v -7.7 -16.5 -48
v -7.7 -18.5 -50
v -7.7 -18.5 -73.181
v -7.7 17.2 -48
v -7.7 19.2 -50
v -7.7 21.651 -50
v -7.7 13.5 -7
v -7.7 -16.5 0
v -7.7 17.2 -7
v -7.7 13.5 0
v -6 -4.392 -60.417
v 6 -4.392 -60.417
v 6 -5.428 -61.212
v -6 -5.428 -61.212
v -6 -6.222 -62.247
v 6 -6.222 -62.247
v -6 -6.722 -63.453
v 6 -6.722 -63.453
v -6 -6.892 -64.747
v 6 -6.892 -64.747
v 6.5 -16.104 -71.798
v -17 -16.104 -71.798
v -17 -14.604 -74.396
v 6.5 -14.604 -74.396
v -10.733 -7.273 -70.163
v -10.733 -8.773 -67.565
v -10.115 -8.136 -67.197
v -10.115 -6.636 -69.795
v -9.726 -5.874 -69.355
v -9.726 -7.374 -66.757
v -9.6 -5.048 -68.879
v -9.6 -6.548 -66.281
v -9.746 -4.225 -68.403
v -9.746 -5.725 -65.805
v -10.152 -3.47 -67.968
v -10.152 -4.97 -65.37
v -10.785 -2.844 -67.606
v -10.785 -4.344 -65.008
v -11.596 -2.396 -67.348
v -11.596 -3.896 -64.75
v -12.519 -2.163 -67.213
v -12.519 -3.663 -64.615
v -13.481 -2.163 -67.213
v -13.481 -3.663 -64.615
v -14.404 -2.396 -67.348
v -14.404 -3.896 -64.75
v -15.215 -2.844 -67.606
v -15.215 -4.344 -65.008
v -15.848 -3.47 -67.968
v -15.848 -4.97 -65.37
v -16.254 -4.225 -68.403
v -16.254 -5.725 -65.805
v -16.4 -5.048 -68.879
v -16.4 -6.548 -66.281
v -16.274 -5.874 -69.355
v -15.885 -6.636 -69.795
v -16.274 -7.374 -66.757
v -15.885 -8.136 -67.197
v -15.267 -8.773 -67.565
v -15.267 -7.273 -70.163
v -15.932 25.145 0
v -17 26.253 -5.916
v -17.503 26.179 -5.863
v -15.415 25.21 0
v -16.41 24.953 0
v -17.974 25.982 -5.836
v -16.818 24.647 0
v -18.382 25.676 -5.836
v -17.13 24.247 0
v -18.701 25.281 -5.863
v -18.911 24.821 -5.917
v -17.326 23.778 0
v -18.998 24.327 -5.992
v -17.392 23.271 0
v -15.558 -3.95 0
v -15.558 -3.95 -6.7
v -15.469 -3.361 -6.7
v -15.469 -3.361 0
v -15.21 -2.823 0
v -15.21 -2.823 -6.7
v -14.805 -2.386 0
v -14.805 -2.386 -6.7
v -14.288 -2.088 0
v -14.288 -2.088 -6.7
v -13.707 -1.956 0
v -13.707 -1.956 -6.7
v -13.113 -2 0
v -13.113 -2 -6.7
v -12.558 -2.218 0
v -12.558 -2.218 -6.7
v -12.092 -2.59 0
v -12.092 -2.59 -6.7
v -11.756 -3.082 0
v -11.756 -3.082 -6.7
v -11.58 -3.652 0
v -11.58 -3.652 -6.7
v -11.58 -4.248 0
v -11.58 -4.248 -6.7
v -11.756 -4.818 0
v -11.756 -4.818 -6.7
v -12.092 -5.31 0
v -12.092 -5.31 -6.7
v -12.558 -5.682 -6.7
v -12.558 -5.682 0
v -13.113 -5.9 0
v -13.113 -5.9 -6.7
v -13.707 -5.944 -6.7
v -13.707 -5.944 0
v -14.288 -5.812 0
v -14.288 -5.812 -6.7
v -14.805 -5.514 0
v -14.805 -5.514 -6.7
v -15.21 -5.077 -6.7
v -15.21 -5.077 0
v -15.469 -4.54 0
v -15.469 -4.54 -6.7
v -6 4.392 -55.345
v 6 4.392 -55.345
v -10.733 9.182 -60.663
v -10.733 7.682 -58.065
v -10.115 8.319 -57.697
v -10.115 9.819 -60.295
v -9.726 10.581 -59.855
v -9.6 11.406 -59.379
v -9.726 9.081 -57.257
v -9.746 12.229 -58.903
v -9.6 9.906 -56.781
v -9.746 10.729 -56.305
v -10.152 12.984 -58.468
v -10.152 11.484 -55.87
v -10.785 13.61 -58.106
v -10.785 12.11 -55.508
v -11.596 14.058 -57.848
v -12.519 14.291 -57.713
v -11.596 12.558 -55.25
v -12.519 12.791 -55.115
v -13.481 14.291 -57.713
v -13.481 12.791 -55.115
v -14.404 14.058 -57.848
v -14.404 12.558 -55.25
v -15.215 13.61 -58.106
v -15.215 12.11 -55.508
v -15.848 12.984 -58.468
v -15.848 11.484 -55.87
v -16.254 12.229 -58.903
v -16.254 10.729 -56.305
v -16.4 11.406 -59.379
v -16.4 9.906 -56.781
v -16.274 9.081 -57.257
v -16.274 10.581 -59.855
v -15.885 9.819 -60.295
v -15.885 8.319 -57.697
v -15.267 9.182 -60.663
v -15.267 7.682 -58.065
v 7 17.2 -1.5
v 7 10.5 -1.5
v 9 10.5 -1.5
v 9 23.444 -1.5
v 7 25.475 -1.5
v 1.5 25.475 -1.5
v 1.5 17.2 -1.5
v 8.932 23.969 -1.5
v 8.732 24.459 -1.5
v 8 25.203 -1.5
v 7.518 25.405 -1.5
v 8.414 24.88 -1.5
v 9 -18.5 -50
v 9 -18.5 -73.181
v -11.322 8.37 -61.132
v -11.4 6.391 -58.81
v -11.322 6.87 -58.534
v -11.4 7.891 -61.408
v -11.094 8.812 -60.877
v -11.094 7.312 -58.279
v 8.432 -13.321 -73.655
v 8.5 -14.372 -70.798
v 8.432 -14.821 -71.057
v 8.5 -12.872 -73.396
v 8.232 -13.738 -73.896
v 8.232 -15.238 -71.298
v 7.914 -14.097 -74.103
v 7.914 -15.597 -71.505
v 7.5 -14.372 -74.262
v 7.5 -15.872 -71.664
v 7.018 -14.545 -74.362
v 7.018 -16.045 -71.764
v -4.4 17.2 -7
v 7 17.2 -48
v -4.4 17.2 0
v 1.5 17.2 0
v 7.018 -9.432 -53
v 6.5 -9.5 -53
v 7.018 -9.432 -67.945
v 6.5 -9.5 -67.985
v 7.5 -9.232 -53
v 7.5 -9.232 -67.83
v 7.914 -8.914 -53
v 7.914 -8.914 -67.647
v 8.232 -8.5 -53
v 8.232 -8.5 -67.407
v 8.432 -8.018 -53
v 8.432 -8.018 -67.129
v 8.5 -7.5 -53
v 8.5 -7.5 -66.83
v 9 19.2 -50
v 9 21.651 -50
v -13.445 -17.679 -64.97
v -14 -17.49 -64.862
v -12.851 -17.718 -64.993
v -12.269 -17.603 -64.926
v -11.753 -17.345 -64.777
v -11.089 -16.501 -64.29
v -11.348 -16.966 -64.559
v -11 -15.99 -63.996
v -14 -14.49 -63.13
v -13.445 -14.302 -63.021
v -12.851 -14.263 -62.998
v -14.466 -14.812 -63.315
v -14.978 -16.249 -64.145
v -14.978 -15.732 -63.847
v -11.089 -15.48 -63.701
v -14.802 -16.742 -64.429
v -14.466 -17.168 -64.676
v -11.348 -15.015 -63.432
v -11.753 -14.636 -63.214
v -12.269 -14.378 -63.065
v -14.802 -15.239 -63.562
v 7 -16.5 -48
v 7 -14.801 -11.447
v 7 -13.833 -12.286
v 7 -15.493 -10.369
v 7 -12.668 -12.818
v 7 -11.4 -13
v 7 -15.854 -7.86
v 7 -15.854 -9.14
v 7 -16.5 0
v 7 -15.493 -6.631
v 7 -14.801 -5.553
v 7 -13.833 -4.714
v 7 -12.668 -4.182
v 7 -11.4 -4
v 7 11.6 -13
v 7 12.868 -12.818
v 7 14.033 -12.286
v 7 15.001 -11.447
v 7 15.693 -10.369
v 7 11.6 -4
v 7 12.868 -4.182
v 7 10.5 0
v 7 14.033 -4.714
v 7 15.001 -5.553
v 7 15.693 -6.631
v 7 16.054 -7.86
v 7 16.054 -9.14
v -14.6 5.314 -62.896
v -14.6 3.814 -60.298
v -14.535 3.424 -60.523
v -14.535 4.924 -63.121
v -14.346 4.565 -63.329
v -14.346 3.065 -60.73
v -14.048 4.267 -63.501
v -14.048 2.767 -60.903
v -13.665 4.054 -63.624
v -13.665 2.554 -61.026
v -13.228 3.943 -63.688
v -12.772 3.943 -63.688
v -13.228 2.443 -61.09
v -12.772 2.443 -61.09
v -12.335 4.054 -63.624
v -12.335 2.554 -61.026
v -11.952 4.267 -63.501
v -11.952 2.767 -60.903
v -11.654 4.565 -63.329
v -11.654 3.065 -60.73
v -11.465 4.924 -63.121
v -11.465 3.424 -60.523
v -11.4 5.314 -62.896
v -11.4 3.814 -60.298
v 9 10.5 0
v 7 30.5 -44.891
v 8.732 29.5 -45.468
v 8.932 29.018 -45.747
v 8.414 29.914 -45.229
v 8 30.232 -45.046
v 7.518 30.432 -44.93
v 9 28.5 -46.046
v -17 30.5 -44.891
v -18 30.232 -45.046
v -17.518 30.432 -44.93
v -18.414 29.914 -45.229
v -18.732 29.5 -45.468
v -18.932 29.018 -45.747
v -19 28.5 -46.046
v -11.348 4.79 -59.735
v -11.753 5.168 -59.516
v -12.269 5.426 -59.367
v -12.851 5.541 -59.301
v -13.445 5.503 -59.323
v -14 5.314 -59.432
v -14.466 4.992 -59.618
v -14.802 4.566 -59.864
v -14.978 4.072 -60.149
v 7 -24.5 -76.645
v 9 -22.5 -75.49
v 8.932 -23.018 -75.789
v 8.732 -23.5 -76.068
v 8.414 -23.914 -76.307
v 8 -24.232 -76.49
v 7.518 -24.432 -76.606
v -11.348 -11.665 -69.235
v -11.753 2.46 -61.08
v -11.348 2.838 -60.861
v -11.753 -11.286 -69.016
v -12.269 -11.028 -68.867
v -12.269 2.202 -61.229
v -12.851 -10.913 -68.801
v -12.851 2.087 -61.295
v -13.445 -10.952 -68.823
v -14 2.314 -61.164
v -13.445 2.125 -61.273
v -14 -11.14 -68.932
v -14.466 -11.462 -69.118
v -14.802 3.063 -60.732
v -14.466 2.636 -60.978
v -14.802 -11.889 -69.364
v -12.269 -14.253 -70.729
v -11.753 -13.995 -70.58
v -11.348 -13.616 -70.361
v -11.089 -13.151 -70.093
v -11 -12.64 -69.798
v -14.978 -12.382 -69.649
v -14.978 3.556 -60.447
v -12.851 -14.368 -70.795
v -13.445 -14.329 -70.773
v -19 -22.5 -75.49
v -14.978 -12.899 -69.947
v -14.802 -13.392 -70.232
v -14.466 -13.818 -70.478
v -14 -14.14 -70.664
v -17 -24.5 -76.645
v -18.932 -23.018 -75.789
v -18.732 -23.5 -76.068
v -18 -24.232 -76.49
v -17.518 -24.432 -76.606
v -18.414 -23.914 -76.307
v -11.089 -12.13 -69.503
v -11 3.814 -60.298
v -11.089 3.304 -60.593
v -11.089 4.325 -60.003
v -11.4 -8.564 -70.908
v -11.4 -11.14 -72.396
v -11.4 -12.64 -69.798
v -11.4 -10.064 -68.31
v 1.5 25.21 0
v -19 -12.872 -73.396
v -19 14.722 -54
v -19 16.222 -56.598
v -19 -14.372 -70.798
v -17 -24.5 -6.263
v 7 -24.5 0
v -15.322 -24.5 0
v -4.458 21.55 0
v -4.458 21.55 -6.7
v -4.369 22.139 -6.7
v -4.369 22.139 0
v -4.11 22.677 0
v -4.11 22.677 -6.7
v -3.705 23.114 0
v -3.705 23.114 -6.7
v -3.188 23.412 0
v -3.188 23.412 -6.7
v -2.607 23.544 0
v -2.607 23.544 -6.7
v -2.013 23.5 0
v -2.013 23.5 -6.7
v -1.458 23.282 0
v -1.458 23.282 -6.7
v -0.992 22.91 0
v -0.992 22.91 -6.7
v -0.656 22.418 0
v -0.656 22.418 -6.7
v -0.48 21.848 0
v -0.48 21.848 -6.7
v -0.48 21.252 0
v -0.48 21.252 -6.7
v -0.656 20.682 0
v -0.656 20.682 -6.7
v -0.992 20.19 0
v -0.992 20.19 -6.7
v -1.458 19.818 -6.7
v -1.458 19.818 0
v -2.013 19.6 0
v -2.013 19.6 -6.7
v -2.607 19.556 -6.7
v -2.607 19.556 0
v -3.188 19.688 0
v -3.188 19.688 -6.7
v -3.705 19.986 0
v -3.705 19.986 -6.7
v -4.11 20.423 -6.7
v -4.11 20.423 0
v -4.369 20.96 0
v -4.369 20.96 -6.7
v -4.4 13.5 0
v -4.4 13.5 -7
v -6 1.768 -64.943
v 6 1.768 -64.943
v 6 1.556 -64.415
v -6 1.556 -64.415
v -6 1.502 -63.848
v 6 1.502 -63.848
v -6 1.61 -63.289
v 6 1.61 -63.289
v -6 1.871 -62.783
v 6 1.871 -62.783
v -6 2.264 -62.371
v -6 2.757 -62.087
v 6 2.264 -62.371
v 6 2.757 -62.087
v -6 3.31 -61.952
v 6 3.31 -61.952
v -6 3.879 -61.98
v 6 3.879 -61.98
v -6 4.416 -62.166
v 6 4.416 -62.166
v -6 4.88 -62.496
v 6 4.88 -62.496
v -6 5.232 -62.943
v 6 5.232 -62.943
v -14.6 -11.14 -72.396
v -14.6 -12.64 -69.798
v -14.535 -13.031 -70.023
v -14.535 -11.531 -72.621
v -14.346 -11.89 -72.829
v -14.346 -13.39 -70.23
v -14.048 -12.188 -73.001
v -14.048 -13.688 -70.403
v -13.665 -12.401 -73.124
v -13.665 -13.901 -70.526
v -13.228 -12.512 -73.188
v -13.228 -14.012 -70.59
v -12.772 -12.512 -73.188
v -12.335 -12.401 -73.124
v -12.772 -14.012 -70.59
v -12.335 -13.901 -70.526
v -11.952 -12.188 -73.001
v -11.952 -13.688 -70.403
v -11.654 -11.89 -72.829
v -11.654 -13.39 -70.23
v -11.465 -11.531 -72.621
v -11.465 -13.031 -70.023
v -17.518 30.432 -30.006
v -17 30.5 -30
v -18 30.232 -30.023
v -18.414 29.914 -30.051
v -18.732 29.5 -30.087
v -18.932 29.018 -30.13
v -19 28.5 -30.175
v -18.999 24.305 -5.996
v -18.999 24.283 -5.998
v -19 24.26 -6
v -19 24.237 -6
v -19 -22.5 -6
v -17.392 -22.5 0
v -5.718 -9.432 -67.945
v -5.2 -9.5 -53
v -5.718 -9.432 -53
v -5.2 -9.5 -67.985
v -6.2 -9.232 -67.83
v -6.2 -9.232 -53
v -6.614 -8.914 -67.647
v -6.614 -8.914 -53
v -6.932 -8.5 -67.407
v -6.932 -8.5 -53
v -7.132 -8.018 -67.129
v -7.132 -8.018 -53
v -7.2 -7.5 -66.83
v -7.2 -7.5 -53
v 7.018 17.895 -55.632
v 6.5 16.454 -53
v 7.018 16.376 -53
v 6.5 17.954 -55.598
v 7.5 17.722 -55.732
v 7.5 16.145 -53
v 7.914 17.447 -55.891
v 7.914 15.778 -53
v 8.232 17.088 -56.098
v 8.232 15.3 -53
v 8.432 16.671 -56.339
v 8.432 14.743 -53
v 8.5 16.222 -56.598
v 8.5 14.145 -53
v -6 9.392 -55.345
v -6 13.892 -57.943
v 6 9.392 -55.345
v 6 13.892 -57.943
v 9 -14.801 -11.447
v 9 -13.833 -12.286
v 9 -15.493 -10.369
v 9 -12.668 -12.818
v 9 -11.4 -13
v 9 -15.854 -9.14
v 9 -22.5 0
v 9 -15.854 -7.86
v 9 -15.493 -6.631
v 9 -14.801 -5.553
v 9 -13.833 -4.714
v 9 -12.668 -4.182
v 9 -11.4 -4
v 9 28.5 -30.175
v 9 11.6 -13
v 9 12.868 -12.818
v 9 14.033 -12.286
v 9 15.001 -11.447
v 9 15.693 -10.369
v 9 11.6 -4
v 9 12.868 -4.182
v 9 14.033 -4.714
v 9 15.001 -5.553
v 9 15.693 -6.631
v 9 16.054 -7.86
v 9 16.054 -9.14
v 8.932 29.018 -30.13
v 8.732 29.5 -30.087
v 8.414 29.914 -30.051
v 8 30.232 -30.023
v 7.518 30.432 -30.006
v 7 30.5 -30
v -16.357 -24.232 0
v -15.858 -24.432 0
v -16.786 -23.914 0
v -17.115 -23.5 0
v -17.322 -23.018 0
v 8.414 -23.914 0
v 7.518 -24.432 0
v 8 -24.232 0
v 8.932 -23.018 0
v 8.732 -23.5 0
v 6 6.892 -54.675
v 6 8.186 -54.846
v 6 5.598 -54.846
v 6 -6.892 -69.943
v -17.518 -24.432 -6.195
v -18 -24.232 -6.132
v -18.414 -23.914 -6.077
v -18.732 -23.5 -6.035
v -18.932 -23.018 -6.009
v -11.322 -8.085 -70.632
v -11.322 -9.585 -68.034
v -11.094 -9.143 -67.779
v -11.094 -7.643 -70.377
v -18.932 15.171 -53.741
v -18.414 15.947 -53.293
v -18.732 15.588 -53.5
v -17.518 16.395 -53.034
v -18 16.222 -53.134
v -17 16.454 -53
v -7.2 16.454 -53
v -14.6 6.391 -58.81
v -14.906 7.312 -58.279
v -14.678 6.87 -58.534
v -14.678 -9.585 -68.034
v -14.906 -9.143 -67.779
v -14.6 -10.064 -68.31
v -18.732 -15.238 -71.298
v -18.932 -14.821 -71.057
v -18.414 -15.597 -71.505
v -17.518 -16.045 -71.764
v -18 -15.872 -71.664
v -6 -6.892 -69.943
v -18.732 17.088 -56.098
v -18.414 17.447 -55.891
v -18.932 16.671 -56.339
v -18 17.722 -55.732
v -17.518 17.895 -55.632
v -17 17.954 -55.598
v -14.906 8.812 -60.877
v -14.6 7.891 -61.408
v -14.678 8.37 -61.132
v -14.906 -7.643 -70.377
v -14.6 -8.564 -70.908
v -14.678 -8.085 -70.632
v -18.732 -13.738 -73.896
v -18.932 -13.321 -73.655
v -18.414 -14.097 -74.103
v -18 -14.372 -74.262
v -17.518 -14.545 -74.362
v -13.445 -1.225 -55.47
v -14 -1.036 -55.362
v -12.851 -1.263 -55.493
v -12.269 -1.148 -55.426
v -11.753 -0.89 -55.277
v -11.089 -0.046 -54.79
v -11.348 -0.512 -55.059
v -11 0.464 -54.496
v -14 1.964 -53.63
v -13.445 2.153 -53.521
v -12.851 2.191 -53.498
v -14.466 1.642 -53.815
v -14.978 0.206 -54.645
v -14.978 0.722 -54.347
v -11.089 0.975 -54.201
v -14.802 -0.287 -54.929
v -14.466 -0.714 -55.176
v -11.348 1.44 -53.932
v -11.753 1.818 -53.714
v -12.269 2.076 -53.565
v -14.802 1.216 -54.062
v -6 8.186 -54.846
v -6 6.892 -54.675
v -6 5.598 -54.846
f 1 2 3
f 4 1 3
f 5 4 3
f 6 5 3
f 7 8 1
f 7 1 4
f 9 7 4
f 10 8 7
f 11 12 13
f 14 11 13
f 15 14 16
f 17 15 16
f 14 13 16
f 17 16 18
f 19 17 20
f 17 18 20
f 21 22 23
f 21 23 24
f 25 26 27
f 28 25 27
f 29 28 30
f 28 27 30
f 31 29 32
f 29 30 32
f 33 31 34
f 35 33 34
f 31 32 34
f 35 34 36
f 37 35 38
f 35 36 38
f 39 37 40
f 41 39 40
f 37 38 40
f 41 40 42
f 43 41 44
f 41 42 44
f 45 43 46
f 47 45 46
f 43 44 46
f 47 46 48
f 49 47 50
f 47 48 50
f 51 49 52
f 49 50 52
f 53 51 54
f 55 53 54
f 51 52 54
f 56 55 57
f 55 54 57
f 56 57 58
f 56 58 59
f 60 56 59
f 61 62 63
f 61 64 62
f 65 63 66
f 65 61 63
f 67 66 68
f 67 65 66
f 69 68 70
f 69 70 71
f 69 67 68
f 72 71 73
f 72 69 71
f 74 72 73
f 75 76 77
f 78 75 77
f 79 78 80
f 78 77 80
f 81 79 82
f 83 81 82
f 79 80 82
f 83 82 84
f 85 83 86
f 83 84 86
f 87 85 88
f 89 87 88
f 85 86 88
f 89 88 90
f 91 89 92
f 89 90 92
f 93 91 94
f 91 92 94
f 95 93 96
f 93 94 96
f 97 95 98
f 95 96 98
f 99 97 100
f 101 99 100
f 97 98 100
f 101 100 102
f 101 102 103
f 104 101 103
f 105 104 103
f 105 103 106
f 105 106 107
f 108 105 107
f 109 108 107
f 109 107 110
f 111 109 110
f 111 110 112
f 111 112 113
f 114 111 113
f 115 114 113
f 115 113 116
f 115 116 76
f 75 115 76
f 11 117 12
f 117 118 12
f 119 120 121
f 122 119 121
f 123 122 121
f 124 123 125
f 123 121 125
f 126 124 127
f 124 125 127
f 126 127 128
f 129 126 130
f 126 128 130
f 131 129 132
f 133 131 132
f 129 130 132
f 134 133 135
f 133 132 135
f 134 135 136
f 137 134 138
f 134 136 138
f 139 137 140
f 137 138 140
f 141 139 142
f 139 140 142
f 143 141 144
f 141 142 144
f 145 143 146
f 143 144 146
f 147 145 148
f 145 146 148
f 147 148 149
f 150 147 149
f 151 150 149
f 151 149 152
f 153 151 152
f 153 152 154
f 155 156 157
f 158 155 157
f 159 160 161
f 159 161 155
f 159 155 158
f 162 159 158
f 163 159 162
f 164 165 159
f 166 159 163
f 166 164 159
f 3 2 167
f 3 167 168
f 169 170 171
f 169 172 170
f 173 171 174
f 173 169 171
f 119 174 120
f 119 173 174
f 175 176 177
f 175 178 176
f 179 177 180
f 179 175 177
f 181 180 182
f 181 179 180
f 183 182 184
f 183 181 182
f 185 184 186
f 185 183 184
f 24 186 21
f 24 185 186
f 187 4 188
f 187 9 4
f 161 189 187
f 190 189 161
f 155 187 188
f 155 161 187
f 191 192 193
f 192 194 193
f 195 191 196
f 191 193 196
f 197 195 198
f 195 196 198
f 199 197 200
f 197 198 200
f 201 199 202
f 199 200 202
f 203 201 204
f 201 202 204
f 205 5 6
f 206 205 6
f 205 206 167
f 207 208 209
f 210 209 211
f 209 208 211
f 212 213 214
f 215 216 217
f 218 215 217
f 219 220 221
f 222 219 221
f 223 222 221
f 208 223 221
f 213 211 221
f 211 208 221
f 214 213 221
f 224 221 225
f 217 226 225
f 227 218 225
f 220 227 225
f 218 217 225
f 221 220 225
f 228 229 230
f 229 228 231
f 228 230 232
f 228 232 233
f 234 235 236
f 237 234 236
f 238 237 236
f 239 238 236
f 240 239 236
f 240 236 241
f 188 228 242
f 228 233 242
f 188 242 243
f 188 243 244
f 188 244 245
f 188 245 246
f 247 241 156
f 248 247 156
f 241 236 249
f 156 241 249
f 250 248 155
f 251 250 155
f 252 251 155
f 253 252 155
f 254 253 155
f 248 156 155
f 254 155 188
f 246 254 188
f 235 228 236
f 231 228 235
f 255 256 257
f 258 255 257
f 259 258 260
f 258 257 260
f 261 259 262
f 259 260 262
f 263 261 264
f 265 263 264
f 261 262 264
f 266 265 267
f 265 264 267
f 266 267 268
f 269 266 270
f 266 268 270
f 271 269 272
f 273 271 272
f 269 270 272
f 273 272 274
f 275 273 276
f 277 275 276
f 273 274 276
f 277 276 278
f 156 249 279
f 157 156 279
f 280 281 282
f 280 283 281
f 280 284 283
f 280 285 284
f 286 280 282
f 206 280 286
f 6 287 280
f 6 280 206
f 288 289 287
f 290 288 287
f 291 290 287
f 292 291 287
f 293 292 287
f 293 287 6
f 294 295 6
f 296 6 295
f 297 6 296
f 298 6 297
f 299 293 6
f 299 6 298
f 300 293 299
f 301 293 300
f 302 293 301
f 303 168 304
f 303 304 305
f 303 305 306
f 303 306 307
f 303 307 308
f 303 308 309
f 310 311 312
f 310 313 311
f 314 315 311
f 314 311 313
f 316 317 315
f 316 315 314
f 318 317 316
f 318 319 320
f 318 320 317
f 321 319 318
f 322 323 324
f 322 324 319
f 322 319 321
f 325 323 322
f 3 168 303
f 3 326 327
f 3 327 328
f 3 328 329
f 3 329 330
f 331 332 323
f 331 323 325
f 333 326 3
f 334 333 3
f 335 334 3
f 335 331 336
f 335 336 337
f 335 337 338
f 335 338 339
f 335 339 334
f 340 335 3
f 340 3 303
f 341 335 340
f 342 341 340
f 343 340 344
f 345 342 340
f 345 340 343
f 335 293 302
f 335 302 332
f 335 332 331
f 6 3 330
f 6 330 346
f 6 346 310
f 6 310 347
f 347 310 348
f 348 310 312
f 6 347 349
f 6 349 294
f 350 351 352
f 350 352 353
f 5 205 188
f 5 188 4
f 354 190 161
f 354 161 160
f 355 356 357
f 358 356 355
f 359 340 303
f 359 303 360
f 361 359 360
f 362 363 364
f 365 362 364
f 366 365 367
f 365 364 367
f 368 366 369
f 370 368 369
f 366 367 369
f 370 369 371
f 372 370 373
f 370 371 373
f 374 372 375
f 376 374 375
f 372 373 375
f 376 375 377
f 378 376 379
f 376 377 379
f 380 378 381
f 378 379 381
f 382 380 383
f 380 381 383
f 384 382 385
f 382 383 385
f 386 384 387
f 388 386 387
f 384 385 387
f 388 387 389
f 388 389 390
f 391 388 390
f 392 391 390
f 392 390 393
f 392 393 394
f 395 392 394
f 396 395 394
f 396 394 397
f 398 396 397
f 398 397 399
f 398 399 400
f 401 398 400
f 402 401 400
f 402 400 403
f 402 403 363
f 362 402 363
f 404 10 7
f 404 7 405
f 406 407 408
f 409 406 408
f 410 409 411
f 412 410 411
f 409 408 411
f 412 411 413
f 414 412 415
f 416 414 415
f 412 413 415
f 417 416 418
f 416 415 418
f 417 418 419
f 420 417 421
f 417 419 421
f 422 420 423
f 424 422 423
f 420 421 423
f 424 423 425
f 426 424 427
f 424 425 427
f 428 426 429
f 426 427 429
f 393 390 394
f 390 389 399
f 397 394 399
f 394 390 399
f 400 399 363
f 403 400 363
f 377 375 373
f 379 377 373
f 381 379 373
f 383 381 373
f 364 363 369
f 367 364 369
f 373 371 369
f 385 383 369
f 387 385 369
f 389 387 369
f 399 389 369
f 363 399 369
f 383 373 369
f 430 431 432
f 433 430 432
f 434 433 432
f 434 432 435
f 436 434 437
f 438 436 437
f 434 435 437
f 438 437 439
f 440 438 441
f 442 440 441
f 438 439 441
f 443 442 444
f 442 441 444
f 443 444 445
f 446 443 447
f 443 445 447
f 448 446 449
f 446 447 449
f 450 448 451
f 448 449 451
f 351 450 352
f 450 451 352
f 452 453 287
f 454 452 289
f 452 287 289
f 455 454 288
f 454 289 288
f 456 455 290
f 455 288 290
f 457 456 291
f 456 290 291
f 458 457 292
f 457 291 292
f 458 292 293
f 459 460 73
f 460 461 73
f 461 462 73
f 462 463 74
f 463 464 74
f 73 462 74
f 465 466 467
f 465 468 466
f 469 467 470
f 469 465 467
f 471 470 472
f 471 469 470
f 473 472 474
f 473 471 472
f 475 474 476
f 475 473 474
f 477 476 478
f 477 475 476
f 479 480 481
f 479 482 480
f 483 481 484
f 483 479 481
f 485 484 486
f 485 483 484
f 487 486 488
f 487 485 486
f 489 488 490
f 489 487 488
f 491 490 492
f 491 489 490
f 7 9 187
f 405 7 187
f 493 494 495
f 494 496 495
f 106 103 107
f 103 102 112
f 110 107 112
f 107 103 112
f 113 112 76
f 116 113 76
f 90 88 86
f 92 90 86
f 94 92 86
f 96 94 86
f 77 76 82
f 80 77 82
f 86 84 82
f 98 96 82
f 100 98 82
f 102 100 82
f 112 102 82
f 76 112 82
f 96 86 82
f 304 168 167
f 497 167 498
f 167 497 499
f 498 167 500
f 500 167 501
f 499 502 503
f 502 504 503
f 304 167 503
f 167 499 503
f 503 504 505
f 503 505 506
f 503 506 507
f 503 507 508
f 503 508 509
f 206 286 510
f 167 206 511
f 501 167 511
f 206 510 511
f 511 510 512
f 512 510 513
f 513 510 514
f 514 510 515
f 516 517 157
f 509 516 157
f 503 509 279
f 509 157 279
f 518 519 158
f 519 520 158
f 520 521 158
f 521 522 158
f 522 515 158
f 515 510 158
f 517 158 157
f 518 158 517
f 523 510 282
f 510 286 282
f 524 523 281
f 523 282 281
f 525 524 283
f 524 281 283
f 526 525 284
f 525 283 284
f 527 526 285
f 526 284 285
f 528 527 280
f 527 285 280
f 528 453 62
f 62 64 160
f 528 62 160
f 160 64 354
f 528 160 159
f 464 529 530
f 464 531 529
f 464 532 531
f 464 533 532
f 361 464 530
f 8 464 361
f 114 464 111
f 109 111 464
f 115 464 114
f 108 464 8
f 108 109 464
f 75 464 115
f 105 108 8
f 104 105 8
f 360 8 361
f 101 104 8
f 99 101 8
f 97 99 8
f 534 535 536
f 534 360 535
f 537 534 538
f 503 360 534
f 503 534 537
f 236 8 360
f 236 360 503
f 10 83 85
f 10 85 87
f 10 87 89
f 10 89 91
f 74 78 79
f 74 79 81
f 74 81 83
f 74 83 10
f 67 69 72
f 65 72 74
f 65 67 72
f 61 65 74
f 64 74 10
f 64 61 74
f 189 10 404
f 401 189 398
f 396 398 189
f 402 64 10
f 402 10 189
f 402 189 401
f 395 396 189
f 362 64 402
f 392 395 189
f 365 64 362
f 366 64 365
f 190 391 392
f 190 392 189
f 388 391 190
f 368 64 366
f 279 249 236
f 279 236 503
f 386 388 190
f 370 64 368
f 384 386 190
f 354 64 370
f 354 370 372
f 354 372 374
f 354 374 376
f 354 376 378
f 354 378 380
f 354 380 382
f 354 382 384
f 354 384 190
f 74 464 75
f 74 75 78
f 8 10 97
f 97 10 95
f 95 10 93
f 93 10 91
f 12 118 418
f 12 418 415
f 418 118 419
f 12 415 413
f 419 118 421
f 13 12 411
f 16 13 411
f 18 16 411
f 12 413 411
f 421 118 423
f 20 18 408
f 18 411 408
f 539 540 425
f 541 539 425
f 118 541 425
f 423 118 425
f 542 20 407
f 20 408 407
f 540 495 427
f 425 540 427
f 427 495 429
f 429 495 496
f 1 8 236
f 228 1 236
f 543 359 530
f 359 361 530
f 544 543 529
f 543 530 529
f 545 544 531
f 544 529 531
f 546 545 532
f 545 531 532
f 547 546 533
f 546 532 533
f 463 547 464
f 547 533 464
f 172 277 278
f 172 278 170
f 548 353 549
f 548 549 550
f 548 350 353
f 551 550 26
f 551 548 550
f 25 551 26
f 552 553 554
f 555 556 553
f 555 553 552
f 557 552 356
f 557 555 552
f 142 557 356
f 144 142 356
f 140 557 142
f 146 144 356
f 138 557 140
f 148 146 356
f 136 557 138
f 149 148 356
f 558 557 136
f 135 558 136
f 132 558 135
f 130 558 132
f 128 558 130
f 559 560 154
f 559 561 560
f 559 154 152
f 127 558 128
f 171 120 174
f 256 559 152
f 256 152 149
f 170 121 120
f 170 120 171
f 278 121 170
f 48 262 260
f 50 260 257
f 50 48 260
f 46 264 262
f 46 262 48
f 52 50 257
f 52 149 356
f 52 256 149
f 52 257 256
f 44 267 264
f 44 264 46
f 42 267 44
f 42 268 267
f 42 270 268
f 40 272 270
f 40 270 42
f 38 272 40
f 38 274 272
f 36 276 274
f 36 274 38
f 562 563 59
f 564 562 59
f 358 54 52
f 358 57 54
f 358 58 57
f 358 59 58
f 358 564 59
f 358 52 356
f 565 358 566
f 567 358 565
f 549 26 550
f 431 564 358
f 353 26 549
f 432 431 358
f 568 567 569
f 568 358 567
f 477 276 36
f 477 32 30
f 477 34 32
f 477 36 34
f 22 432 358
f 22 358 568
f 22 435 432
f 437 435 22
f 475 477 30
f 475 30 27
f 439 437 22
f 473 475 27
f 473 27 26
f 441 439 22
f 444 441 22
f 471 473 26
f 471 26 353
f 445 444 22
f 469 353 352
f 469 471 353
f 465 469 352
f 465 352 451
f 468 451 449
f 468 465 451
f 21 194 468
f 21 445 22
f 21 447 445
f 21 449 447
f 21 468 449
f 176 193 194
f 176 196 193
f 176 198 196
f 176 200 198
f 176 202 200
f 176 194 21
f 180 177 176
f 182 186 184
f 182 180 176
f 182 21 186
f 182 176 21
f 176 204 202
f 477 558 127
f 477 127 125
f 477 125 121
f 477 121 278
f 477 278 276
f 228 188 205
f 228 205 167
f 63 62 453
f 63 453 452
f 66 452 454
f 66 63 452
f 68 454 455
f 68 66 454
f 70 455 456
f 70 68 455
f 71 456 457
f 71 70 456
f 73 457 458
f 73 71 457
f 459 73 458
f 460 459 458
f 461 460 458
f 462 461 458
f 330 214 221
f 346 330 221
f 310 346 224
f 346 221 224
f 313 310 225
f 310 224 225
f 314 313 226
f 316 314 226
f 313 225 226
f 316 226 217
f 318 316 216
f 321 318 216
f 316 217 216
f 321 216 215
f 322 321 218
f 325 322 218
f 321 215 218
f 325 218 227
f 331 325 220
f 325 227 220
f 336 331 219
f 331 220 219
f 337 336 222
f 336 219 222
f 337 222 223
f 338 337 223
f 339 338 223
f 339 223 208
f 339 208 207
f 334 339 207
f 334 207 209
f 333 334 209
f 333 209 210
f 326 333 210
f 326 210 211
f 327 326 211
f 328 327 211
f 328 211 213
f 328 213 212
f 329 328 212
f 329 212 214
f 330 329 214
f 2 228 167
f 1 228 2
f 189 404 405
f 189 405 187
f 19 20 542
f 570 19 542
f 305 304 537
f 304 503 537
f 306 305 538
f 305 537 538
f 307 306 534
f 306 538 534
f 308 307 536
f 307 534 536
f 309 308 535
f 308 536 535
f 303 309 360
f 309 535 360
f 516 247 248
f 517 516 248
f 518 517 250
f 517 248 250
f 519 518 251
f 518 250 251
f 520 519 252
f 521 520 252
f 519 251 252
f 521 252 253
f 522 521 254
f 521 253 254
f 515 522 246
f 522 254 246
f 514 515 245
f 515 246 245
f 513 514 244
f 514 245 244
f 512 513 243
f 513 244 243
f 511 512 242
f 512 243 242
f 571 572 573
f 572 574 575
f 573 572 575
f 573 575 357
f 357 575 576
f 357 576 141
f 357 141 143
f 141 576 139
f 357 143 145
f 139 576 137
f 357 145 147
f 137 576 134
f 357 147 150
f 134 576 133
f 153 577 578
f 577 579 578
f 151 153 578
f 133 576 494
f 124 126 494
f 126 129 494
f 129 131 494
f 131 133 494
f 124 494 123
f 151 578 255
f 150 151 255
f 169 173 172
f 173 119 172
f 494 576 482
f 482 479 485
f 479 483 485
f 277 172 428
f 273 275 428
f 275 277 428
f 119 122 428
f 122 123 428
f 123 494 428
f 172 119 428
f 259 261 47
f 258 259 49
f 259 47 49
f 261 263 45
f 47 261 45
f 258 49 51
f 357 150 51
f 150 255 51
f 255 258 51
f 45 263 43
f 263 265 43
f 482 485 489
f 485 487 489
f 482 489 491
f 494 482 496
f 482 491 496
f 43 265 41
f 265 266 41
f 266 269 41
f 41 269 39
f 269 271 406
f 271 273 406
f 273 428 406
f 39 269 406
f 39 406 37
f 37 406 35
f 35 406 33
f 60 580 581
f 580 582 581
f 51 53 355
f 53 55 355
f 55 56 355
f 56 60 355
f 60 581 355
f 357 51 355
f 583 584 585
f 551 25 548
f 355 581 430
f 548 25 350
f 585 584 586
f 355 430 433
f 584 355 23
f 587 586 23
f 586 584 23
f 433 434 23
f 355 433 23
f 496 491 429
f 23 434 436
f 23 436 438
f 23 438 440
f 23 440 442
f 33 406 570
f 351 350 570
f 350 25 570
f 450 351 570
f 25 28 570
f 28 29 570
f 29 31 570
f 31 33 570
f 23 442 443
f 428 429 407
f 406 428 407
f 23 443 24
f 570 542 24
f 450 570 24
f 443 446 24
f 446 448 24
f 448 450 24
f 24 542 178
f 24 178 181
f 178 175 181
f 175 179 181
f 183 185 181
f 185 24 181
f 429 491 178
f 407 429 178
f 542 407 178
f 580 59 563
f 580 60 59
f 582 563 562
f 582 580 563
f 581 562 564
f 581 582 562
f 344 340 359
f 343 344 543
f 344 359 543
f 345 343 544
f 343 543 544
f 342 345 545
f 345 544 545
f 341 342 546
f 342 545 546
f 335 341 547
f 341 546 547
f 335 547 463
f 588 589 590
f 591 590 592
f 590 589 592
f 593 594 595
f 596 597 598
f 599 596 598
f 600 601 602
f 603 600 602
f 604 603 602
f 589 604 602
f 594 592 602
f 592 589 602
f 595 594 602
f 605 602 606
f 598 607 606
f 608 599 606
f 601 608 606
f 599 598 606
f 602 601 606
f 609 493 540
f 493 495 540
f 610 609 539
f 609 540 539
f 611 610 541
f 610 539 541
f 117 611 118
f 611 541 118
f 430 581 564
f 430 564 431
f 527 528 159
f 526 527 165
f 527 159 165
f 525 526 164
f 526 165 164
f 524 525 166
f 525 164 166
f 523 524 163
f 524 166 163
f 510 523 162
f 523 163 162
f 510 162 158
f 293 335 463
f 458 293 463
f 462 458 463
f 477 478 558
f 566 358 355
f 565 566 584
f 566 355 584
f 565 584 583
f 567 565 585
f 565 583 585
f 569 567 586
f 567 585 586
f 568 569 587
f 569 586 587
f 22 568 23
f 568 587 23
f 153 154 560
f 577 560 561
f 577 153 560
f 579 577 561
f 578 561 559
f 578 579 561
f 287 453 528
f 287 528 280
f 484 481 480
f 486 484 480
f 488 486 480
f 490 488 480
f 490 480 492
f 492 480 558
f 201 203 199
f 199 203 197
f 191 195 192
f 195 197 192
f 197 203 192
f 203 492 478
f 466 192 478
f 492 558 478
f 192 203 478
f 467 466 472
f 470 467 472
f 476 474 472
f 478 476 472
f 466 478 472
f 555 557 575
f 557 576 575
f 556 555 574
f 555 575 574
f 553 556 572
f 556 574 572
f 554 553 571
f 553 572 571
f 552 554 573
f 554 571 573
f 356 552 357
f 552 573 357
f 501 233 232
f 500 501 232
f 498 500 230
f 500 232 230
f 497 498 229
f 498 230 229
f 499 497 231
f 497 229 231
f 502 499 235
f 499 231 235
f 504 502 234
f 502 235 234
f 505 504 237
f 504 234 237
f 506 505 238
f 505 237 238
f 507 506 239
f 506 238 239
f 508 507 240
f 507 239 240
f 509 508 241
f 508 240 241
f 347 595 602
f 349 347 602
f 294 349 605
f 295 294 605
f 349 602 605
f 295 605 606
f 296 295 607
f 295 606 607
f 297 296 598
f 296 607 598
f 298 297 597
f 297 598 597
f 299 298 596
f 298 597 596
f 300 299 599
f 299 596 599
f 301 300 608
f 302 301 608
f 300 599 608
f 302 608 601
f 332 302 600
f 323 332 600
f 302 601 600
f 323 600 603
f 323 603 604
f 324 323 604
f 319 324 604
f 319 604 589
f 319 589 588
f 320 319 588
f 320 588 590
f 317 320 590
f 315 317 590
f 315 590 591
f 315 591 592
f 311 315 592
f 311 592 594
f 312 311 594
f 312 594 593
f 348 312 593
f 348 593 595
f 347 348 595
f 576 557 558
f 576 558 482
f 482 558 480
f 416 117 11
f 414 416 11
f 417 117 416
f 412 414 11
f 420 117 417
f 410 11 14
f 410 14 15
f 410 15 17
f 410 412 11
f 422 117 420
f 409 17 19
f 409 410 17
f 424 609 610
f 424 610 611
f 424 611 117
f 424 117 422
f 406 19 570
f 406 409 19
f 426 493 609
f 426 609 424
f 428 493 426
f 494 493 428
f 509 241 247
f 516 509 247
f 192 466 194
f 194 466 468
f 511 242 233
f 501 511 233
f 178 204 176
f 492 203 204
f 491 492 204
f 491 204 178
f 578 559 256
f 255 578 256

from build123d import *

# Parameters (mm, degrees)
CORPS_DEPTH                           = 9
CORPS_DEPTH_BACK                      = 19
ESQUISSE3_W                           = 14.7
ESQUISSE3_H                           = 33.7
CAVITE_BATTERIE_DEPTH                 = 85.650567232
DIAM_TRE_DU_PER_AGE_4_0_4_1_D         = 4
DIAM_TRE_DU_PER_AGE_4_0_4_1_DEPTH     = 6.7
DIAM_TRE_DU_PER_AGE_4_0_4_2_D         = 4
DIAM_TRE_DU_PER_AGE_4_0_4_2_DEPTH     = 6.7
ESQUISSE8_W                           = 26.645081595
ESQUISSE8_H                           = 40.150635095
DEGAGEMENT_TRAPPE_ET_CONNECTEUR_DEPTH = 85.164176065
CHANFREIN1_SIZE                       = 2
ESQUISSE9_W                           = 3.3
ESQUISSE9_H                           = 3.7
DETROMPEUR_BATTERIE_DEPTH             = 7
CHANFREIN2_SIZE                       = 30
CHANFREIN2_SIZE2                      = 5.289809421
CHANFREIN3_SIZE                       = 6
CHANFREIN3_SIZE2                      = 1.607695155
ESQUISSE10_W                          = 7.5
ESQUISSE10_H                          = 20
DEGAGEMENT_PIN_INTERRUPTEUR_DEPTH     = 1.5
CONG_2_R                              = 2
ESQUISSE11_W                          = 37.595854812
ESQUISSE11_H                          = 27.5
CORPS_BUTEE_1_DEPTH                   = 3
CORPS_BUTEE_2_START                   = 0.5
CORPS_BUTEE_2_DEPTH                   = 15.7
ACCROCHE_TRAPPE_DEPTH                 = 6
TROU_DE_SERRURE_DEPTH                 = 73.229072398
CONG_1_R                              = 2


with BuildPart() as part:
    # Esquisse2 → corps (new, two sides: drawn at the far end of the back side and taken through both)
    with BuildSketch(Plane(origin=(0, 0, 0), x_dir=(0, 0, -1), z_dir=(1, 0, 0)).offset(-CORPS_DEPTH_BACK)):
        Polygon((0, -24.5), (0, 30.5), (44.89081679, 30.5), (76.645081595, -24.5), align=None)
    extrude(amount=CORPS_DEPTH + CORPS_DEPTH_BACK)

    # Esquisse3 → cavite_batterie (cut, through all)
    with BuildSketch(Plane.XY):
        with Locations((-0.35, 0.35)):
            Rectangle(ESQUISSE3_W, ESQUISSE3_H)
    extrude(amount=-CAVITE_BATTERIE_DEPTH, mode=Mode.SUBTRACT)

    # Diamètre du perçage Ø4.0 (4)1
    with Locations(Plane.XY):
        with Locations((-2.45764, 21.549972456), (-13.55764, -3.950027544)):
            Hole(DIAM_TRE_DU_PER_AGE_4_0_4_1_D / 2, depth=DIAM_TRE_DU_PER_AGE_4_0_4_1_DEPTH)

    # Diamètre du perçage Ø4.0 (4)2
    with Locations(Plane(origin=(0, 27.063293868, -46.875), x_dir=(-1, 0, 0), z_dir=(0, 0.49999999999999806, -0.8660254037844397))):
        with Locations((13, -26.845854812), (13, -45.845854812)):
            Hole(DIAM_TRE_DU_PER_AGE_4_0_4_2_D / 2, depth=DIAM_TRE_DU_PER_AGE_4_0_4_2_DEPTH)

    # Esquisse8 → degagement_trappe et connecteur (cut, through all)
    with BuildSketch(Plane(origin=(-7.7, 0, 0), x_dir=(0, 0, -1), z_dir=(1, 0, 0))):
        with Locations((63.322540798, 1.575317548)):
            Rectangle(ESQUISSE8_W, ESQUISSE8_H)
        with BuildLine():
            Line((13, 11.599974456), (13, -11.400025544))
            ThreePointArc((13, -11.400025544), (8.5, -15.900025544), (4, -11.400025544))
            Line((4, -11.400025544), (4, 11.599974456))
            ThreePointArc((4, 11.599974456), (8.5, 16.099974456), (13, 11.599974456))
        make_face()
    extrude(amount=DEGAGEMENT_TRAPPE_ET_CONNECTEUR_DEPTH, mode=Mode.SUBTRACT)

    # Chanfrein1
    chanfrein1_edges = [part.edges().sort_by_distance(p)[0] for p in [
        (-0.35, 17.2, -50),
        (-0.35, -16.5, -50),
        (7, 0.35, -50),
    ]]
    chamfer(chanfrein1_edges, length=CHANFREIN1_SIZE - 0.0001)  # a hair under: the kernel refuses the full size

    # Esquisse9 → detrompeur_batterie (add)
    with BuildSketch(Plane.XY):
        with Locations((-6.05, 15.35)):
            Rectangle(ESQUISSE9_W, ESQUISSE9_H)
    extrude(amount=-DETROMPEUR_BATTERIE_DEPTH)

    # Chanfrein2
    chanfrein2_edges = [part.edges().sort_by_distance(p)[0] for p in [
        (-5, 30.5, 0),
    ]]
    chanfrein2_side = [part.faces().sort_by_distance(p)[0] for p in [
        (-5, 30.5, -22.445408395),
    ]]
    chamfer(chanfrein2_edges, length=CHANFREIN2_SIZE, length2=CHANFREIN2_SIZE2, reference=chanfrein2_side[0])

    # Chanfrein3
    chanfrein3_edges = [part.edges().sort_by_distance(p)[0] for p in [
        (-19, 0.355095289, 0),
    ]]
    chanfrein3_side = [part.faces().sort_by_distance(p)[0] for p in [
        (-19, -0.079128224, -31.587868667),
    ]]
    chamfer(chanfrein3_edges, length=CHANFREIN3_SIZE, length2=CHANFREIN3_SIZE2, reference=chanfrein3_side[0])

    # Esquisse10 → degagement_pin_interrupteur (cut)
    with BuildSketch(Plane.XY):
        with Locations((5.25, 20.5)):
            Rectangle(ESQUISSE10_W, ESQUISSE10_H)
    extrude(amount=-DEGAGEMENT_PIN_INTERRUPTEUR_DEPTH, mode=Mode.SUBTRACT)

    # Congé2
    cong_2_edges = [part.edges().sort_by_distance(p)[0] for p in [
        (-19, 30.5, -37.445408395),
        (9, 30.5, -37.445408395),
        (9, 27.987340525, -15.75),
        (-19, -24.5, -41.322540798),
        (-18.196152423, -24.5, -3),
        (-19, 28.384076231, -18),
        (-18.196152423, 25.739171521, -3),
        (9, -24.5, -38.322540798),
    ]]
    fillet(cong_2_edges, radius=CONG_2_R)


with BuildPart() as body_2:
    # Esquisse11 → corps_butee_1 (new body)
    with BuildSketch(Plane(origin=(0, 27.063293868, -46.875), x_dir=(0, -0.8660254037844398, -0.499999999999998), z_dir=(0, -0.49999999999999806, 0.8660254037844399))):
        with Locations((31.047927406, -5.25)):
            Rectangle(ESQUISSE11_W, ESQUISSE11_H)
    extrude(amount=-CORPS_BUTEE_1_DEPTH)

    # Esquisse12 → corps_butee_2 (add)
    with BuildSketch(Plane(origin=(-7.7, 0, 0), x_dir=(0, 0, -1), z_dir=(1, 0, 0)).offset(CORPS_BUTEE_2_START)):
        Polygon((53, 16.454482672), (53, -9.5), (67.984827557, -9.5), align=None)
    extrude(amount=CORPS_BUTEE_2_DEPTH)

    # Esquisse14 → accroche_trappe (cut, symmetric)
    with BuildSketch(Plane(origin=(0, 0, 0), x_dir=(0, 0, -1), z_dir=(1, 0, 0))):
        with BuildLine():
            Line((55.345299462, 4.392304845), (60.417096231, -4.392304845))
            ThreePointArc((60.417096231, -4.392304845), (62.24722325, -6.222431864), (64.74722325, -6.892304845))
            Line((64.74722325, -6.892304845), (69.943375673, -6.892304845))
            Line((69.943375673, -6.892304845), (64.943375673, 1.767949192))
            ThreePointArc((64.943375673, 1.767949192), (62.211324865, 2.5), (62.943375673, 5.232050808))
            Line((62.943375673, 5.232050808), (57.943375673, 13.892304845))
            Line((57.943375673, 13.892304845), (55.345299462, 9.392304845))
            ThreePointArc((55.345299462, 9.392304845), (54.675426481, 6.892304845), (55.345299462, 4.392304845))
        make_face()
    extrude(amount=ACCROCHE_TRAPPE_DEPTH, both=True, mode=Mode.SUBTRACT)

    # Esquisse13 → trou_de_serrure (cut, through all)
    with BuildSketch(Plane(origin=(0, 27.063293868, -46.875), x_dir=(0, -0.8660254037844398, -0.499999999999998), z_dir=(0, -0.49999999999999806, 0.8660254037844399))):
        with BuildLine():
            Line((45.845854812, -11.4), (41.845854812, -11.4))
            ThreePointArc((41.845854812, -11.4), (35.445854812, -13), (41.845854812, -14.6))
            Line((41.845854812, -14.6), (45.845854812, -14.6))
            ThreePointArc((45.845854812, -14.6), (47.445854812, -13), (45.845854812, -11.4))
        make_face()
        with BuildLine():
            Line((26.845854812, -11.4), (22.845854812, -11.4))
            ThreePointArc((22.845854812, -11.4), (16.445854812, -13), (22.845854812, -14.6))
            Line((22.845854812, -14.6), (26.845854812, -14.6))
            ThreePointArc((26.845854812, -14.6), (28.445854812, -13), (26.845854812, -11.4))
        make_face()
    extrude(amount=-TROU_DE_SERRURE_DEPTH, mode=Mode.SUBTRACT)

    # Congé1
    cong_1_edges = [body_2.edges().sort_by_distance(p)[0] for p in [
        (-7.2, -9.5, -60.492413779),
        (8.5, -9.5, -60.492413779),
        (-14.6, -8.426279442, -69.096965511),
        (-11.4, -8.426279442, -69.096965511),
        (-14.6, 8.02820323, -59.596965511),
        (-11.4, 8.02820323, -59.596965511),
        (-19, -15.354482672, -73.096965511),
        (-19, 17.204482672, -54.299038106),
        (8.5, 17.204482672, -54.299038106),
        (8.5, -15.354482672, -73.096965511),
    ]]
    fillet(cong_1_edges, radius=CONG_1_R)


solid = Compound([part.part, body_2.part])
